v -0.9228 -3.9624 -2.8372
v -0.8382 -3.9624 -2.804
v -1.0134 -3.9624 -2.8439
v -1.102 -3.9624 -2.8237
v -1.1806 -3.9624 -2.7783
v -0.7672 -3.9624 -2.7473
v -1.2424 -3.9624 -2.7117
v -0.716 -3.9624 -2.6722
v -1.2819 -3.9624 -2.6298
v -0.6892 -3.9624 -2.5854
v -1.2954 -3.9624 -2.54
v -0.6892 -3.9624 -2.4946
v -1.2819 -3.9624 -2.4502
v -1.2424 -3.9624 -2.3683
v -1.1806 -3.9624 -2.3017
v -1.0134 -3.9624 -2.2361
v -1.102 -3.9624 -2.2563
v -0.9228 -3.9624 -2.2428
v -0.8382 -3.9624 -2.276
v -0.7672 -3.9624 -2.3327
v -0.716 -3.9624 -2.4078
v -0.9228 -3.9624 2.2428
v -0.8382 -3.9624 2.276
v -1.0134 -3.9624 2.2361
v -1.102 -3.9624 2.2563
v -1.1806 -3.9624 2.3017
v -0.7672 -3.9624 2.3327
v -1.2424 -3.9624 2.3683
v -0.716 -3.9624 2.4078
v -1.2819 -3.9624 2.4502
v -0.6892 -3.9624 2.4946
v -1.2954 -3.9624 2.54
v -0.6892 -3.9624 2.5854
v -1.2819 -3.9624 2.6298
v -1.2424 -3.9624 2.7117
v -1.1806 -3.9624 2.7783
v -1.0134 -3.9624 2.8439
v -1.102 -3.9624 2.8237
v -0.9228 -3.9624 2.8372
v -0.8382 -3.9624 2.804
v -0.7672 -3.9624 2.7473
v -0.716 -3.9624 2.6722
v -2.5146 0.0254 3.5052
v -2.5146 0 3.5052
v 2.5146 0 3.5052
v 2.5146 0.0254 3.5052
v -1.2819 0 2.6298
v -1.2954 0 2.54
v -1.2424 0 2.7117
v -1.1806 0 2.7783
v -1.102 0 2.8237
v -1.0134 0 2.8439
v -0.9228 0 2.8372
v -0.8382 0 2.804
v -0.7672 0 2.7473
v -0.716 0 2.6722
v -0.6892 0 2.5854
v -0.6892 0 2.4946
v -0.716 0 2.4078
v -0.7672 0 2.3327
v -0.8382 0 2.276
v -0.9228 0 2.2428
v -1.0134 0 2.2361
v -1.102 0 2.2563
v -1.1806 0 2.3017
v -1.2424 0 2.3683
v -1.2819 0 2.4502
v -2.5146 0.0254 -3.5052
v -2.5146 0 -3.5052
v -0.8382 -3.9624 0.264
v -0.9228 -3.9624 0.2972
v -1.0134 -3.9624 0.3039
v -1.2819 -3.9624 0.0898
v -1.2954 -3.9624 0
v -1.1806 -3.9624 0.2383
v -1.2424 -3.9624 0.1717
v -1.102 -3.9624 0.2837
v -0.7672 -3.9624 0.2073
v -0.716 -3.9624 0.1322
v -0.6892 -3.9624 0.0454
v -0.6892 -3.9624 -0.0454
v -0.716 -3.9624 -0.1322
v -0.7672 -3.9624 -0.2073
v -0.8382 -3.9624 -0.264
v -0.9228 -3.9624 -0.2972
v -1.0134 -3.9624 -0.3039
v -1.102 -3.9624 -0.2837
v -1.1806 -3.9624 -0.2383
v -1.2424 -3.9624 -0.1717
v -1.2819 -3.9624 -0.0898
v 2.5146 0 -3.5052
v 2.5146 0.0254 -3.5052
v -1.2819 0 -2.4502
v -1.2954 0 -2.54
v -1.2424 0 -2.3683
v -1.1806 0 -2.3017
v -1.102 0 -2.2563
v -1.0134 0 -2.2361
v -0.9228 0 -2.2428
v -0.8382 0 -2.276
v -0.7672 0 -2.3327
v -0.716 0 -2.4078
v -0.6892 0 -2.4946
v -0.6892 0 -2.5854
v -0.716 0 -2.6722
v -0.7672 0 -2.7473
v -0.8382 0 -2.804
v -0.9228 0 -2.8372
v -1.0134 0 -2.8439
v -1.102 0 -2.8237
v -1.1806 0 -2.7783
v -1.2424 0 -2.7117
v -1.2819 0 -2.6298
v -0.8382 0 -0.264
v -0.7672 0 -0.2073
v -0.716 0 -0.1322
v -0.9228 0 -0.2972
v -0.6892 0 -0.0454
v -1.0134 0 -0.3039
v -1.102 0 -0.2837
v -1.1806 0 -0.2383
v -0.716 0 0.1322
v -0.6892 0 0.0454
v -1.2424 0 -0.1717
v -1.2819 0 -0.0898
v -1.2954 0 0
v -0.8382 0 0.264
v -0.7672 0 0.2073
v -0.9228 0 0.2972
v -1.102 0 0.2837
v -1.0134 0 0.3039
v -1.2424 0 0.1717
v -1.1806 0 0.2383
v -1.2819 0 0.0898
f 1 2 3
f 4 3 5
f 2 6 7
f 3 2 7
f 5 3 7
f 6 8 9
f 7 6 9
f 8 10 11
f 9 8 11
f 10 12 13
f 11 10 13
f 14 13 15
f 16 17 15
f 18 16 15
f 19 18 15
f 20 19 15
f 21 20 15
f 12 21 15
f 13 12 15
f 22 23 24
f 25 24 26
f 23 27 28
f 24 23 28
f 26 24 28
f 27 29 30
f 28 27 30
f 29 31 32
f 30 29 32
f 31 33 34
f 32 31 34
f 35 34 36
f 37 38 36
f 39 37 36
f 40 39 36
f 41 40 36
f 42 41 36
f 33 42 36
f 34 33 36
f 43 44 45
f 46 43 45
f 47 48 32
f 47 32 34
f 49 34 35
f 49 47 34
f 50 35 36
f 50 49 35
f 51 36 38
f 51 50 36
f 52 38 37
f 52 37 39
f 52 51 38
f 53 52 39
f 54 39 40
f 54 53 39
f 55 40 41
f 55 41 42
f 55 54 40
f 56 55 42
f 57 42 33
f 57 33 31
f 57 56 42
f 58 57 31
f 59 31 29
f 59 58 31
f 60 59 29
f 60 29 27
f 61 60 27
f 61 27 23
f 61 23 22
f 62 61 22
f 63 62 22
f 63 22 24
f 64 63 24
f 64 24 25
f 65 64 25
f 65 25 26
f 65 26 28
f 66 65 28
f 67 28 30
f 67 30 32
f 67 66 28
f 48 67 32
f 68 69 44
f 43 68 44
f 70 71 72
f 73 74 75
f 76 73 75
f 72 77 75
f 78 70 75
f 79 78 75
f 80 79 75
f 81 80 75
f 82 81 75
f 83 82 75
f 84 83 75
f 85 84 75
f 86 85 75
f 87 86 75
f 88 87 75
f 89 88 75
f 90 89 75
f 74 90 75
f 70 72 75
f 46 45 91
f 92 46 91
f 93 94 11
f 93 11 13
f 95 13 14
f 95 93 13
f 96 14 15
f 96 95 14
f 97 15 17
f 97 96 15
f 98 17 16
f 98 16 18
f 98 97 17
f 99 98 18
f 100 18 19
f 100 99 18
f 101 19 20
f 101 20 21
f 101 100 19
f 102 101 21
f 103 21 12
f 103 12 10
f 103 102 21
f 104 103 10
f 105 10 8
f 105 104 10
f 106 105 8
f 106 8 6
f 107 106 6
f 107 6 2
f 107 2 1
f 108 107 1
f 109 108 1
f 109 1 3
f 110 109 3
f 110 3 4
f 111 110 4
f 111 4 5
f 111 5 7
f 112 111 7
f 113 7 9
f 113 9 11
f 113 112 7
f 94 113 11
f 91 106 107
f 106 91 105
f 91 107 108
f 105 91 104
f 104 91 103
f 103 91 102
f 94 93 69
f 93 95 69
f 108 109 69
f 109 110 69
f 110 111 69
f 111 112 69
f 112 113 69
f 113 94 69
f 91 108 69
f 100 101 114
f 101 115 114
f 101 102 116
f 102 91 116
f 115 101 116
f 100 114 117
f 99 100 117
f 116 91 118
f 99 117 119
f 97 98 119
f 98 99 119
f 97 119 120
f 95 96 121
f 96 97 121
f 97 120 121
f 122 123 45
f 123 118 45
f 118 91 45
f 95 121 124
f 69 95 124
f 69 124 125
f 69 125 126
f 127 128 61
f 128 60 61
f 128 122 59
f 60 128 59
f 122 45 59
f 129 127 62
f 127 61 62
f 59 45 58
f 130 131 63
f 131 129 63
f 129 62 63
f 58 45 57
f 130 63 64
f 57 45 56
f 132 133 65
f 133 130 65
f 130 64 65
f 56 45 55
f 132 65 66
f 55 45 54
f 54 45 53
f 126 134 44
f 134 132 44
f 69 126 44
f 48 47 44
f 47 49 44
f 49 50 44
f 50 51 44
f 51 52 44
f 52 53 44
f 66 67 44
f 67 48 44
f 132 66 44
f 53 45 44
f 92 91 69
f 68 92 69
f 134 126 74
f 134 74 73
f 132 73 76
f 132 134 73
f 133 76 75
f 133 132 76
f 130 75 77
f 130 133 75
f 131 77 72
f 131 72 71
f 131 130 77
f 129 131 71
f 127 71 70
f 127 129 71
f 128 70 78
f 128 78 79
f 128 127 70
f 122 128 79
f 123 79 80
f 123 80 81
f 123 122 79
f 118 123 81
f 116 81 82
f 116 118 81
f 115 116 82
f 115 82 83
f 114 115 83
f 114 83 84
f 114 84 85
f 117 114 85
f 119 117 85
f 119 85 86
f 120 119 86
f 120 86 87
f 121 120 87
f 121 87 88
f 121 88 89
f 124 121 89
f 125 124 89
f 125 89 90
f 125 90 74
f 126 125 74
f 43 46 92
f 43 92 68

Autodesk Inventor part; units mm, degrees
sketch "Sketch_1" plane through (0, 0, 0) normal (0, 1, 0) x (-1, 0, 0)
  line L0 (2.5146, 3.5052) -> (-2.5146, 3.5052)
  line L1 (-2.5146, 3.5052) -> (-2.5146, -3.5052)
  line L2 (-2.5146, -3.5052) -> (2.5146, -3.5052)
  line L3 (2.5146, -3.5052) -> (2.5146, 3.5052)
extrude "Extrusion1" add sketch "Sketch_1" along normal blind 0.0254
sketch "Sketch_2" plane through (0, 0, 0) normal (0, 1, 0) x (-1, 0, 0)
  circle A0 centre (0.9906, 0) radius 0.3048
extrude "Extrusion2" add sketch "Sketch_2" against normal blind 3.9624
sketch "Sketch_3" plane through (0, 0, 0) normal (0, 1, 0) x (-1, 0, 0)
  circle A0 centre (0.9906, -2.54) radius 0.3048
extrude "Extrusion3" add sketch "Sketch_3" against normal blind 3.9624
sketch "Sketch_4" plane through (0, 0, 0) normal (0, 1, 0) x (-1, 0, 0)
  circle A0 centre (0.9906, 2.54) radius 0.3048
extrude "Extrusion4" add sketch "Sketch_4" against normal blind 3.9624
ref_plane "right_vertical_trmnls_XY" through (0, 0, 0) normal (0, 0, -1) x (1, 0, 0)
ref_plane "right_vertical_trmnls_YZ" through (0, 0, 0) normal (1, 0, 0) x (0, -1, 0)
ref_plane "right_vertical_trmnls_ZX" through (0, 0, 0) normal (0, -1, 0) x (0, 0, -1)
ref_plane "stright_trmnls_XY" through (0, 0, 0) normal (0, -1, 0) x (1, 0, 0)
ref_plane "stright_trmnls_YZ" through (0, 0, 0) normal (1, 0, 0) x (0, 0, 1)
ref_plane "stright_trmnls_ZX" through (0, 0, 0) normal (0, 0, 1) x (0, -1, 0)
properties part number "B12APtrmnls"
